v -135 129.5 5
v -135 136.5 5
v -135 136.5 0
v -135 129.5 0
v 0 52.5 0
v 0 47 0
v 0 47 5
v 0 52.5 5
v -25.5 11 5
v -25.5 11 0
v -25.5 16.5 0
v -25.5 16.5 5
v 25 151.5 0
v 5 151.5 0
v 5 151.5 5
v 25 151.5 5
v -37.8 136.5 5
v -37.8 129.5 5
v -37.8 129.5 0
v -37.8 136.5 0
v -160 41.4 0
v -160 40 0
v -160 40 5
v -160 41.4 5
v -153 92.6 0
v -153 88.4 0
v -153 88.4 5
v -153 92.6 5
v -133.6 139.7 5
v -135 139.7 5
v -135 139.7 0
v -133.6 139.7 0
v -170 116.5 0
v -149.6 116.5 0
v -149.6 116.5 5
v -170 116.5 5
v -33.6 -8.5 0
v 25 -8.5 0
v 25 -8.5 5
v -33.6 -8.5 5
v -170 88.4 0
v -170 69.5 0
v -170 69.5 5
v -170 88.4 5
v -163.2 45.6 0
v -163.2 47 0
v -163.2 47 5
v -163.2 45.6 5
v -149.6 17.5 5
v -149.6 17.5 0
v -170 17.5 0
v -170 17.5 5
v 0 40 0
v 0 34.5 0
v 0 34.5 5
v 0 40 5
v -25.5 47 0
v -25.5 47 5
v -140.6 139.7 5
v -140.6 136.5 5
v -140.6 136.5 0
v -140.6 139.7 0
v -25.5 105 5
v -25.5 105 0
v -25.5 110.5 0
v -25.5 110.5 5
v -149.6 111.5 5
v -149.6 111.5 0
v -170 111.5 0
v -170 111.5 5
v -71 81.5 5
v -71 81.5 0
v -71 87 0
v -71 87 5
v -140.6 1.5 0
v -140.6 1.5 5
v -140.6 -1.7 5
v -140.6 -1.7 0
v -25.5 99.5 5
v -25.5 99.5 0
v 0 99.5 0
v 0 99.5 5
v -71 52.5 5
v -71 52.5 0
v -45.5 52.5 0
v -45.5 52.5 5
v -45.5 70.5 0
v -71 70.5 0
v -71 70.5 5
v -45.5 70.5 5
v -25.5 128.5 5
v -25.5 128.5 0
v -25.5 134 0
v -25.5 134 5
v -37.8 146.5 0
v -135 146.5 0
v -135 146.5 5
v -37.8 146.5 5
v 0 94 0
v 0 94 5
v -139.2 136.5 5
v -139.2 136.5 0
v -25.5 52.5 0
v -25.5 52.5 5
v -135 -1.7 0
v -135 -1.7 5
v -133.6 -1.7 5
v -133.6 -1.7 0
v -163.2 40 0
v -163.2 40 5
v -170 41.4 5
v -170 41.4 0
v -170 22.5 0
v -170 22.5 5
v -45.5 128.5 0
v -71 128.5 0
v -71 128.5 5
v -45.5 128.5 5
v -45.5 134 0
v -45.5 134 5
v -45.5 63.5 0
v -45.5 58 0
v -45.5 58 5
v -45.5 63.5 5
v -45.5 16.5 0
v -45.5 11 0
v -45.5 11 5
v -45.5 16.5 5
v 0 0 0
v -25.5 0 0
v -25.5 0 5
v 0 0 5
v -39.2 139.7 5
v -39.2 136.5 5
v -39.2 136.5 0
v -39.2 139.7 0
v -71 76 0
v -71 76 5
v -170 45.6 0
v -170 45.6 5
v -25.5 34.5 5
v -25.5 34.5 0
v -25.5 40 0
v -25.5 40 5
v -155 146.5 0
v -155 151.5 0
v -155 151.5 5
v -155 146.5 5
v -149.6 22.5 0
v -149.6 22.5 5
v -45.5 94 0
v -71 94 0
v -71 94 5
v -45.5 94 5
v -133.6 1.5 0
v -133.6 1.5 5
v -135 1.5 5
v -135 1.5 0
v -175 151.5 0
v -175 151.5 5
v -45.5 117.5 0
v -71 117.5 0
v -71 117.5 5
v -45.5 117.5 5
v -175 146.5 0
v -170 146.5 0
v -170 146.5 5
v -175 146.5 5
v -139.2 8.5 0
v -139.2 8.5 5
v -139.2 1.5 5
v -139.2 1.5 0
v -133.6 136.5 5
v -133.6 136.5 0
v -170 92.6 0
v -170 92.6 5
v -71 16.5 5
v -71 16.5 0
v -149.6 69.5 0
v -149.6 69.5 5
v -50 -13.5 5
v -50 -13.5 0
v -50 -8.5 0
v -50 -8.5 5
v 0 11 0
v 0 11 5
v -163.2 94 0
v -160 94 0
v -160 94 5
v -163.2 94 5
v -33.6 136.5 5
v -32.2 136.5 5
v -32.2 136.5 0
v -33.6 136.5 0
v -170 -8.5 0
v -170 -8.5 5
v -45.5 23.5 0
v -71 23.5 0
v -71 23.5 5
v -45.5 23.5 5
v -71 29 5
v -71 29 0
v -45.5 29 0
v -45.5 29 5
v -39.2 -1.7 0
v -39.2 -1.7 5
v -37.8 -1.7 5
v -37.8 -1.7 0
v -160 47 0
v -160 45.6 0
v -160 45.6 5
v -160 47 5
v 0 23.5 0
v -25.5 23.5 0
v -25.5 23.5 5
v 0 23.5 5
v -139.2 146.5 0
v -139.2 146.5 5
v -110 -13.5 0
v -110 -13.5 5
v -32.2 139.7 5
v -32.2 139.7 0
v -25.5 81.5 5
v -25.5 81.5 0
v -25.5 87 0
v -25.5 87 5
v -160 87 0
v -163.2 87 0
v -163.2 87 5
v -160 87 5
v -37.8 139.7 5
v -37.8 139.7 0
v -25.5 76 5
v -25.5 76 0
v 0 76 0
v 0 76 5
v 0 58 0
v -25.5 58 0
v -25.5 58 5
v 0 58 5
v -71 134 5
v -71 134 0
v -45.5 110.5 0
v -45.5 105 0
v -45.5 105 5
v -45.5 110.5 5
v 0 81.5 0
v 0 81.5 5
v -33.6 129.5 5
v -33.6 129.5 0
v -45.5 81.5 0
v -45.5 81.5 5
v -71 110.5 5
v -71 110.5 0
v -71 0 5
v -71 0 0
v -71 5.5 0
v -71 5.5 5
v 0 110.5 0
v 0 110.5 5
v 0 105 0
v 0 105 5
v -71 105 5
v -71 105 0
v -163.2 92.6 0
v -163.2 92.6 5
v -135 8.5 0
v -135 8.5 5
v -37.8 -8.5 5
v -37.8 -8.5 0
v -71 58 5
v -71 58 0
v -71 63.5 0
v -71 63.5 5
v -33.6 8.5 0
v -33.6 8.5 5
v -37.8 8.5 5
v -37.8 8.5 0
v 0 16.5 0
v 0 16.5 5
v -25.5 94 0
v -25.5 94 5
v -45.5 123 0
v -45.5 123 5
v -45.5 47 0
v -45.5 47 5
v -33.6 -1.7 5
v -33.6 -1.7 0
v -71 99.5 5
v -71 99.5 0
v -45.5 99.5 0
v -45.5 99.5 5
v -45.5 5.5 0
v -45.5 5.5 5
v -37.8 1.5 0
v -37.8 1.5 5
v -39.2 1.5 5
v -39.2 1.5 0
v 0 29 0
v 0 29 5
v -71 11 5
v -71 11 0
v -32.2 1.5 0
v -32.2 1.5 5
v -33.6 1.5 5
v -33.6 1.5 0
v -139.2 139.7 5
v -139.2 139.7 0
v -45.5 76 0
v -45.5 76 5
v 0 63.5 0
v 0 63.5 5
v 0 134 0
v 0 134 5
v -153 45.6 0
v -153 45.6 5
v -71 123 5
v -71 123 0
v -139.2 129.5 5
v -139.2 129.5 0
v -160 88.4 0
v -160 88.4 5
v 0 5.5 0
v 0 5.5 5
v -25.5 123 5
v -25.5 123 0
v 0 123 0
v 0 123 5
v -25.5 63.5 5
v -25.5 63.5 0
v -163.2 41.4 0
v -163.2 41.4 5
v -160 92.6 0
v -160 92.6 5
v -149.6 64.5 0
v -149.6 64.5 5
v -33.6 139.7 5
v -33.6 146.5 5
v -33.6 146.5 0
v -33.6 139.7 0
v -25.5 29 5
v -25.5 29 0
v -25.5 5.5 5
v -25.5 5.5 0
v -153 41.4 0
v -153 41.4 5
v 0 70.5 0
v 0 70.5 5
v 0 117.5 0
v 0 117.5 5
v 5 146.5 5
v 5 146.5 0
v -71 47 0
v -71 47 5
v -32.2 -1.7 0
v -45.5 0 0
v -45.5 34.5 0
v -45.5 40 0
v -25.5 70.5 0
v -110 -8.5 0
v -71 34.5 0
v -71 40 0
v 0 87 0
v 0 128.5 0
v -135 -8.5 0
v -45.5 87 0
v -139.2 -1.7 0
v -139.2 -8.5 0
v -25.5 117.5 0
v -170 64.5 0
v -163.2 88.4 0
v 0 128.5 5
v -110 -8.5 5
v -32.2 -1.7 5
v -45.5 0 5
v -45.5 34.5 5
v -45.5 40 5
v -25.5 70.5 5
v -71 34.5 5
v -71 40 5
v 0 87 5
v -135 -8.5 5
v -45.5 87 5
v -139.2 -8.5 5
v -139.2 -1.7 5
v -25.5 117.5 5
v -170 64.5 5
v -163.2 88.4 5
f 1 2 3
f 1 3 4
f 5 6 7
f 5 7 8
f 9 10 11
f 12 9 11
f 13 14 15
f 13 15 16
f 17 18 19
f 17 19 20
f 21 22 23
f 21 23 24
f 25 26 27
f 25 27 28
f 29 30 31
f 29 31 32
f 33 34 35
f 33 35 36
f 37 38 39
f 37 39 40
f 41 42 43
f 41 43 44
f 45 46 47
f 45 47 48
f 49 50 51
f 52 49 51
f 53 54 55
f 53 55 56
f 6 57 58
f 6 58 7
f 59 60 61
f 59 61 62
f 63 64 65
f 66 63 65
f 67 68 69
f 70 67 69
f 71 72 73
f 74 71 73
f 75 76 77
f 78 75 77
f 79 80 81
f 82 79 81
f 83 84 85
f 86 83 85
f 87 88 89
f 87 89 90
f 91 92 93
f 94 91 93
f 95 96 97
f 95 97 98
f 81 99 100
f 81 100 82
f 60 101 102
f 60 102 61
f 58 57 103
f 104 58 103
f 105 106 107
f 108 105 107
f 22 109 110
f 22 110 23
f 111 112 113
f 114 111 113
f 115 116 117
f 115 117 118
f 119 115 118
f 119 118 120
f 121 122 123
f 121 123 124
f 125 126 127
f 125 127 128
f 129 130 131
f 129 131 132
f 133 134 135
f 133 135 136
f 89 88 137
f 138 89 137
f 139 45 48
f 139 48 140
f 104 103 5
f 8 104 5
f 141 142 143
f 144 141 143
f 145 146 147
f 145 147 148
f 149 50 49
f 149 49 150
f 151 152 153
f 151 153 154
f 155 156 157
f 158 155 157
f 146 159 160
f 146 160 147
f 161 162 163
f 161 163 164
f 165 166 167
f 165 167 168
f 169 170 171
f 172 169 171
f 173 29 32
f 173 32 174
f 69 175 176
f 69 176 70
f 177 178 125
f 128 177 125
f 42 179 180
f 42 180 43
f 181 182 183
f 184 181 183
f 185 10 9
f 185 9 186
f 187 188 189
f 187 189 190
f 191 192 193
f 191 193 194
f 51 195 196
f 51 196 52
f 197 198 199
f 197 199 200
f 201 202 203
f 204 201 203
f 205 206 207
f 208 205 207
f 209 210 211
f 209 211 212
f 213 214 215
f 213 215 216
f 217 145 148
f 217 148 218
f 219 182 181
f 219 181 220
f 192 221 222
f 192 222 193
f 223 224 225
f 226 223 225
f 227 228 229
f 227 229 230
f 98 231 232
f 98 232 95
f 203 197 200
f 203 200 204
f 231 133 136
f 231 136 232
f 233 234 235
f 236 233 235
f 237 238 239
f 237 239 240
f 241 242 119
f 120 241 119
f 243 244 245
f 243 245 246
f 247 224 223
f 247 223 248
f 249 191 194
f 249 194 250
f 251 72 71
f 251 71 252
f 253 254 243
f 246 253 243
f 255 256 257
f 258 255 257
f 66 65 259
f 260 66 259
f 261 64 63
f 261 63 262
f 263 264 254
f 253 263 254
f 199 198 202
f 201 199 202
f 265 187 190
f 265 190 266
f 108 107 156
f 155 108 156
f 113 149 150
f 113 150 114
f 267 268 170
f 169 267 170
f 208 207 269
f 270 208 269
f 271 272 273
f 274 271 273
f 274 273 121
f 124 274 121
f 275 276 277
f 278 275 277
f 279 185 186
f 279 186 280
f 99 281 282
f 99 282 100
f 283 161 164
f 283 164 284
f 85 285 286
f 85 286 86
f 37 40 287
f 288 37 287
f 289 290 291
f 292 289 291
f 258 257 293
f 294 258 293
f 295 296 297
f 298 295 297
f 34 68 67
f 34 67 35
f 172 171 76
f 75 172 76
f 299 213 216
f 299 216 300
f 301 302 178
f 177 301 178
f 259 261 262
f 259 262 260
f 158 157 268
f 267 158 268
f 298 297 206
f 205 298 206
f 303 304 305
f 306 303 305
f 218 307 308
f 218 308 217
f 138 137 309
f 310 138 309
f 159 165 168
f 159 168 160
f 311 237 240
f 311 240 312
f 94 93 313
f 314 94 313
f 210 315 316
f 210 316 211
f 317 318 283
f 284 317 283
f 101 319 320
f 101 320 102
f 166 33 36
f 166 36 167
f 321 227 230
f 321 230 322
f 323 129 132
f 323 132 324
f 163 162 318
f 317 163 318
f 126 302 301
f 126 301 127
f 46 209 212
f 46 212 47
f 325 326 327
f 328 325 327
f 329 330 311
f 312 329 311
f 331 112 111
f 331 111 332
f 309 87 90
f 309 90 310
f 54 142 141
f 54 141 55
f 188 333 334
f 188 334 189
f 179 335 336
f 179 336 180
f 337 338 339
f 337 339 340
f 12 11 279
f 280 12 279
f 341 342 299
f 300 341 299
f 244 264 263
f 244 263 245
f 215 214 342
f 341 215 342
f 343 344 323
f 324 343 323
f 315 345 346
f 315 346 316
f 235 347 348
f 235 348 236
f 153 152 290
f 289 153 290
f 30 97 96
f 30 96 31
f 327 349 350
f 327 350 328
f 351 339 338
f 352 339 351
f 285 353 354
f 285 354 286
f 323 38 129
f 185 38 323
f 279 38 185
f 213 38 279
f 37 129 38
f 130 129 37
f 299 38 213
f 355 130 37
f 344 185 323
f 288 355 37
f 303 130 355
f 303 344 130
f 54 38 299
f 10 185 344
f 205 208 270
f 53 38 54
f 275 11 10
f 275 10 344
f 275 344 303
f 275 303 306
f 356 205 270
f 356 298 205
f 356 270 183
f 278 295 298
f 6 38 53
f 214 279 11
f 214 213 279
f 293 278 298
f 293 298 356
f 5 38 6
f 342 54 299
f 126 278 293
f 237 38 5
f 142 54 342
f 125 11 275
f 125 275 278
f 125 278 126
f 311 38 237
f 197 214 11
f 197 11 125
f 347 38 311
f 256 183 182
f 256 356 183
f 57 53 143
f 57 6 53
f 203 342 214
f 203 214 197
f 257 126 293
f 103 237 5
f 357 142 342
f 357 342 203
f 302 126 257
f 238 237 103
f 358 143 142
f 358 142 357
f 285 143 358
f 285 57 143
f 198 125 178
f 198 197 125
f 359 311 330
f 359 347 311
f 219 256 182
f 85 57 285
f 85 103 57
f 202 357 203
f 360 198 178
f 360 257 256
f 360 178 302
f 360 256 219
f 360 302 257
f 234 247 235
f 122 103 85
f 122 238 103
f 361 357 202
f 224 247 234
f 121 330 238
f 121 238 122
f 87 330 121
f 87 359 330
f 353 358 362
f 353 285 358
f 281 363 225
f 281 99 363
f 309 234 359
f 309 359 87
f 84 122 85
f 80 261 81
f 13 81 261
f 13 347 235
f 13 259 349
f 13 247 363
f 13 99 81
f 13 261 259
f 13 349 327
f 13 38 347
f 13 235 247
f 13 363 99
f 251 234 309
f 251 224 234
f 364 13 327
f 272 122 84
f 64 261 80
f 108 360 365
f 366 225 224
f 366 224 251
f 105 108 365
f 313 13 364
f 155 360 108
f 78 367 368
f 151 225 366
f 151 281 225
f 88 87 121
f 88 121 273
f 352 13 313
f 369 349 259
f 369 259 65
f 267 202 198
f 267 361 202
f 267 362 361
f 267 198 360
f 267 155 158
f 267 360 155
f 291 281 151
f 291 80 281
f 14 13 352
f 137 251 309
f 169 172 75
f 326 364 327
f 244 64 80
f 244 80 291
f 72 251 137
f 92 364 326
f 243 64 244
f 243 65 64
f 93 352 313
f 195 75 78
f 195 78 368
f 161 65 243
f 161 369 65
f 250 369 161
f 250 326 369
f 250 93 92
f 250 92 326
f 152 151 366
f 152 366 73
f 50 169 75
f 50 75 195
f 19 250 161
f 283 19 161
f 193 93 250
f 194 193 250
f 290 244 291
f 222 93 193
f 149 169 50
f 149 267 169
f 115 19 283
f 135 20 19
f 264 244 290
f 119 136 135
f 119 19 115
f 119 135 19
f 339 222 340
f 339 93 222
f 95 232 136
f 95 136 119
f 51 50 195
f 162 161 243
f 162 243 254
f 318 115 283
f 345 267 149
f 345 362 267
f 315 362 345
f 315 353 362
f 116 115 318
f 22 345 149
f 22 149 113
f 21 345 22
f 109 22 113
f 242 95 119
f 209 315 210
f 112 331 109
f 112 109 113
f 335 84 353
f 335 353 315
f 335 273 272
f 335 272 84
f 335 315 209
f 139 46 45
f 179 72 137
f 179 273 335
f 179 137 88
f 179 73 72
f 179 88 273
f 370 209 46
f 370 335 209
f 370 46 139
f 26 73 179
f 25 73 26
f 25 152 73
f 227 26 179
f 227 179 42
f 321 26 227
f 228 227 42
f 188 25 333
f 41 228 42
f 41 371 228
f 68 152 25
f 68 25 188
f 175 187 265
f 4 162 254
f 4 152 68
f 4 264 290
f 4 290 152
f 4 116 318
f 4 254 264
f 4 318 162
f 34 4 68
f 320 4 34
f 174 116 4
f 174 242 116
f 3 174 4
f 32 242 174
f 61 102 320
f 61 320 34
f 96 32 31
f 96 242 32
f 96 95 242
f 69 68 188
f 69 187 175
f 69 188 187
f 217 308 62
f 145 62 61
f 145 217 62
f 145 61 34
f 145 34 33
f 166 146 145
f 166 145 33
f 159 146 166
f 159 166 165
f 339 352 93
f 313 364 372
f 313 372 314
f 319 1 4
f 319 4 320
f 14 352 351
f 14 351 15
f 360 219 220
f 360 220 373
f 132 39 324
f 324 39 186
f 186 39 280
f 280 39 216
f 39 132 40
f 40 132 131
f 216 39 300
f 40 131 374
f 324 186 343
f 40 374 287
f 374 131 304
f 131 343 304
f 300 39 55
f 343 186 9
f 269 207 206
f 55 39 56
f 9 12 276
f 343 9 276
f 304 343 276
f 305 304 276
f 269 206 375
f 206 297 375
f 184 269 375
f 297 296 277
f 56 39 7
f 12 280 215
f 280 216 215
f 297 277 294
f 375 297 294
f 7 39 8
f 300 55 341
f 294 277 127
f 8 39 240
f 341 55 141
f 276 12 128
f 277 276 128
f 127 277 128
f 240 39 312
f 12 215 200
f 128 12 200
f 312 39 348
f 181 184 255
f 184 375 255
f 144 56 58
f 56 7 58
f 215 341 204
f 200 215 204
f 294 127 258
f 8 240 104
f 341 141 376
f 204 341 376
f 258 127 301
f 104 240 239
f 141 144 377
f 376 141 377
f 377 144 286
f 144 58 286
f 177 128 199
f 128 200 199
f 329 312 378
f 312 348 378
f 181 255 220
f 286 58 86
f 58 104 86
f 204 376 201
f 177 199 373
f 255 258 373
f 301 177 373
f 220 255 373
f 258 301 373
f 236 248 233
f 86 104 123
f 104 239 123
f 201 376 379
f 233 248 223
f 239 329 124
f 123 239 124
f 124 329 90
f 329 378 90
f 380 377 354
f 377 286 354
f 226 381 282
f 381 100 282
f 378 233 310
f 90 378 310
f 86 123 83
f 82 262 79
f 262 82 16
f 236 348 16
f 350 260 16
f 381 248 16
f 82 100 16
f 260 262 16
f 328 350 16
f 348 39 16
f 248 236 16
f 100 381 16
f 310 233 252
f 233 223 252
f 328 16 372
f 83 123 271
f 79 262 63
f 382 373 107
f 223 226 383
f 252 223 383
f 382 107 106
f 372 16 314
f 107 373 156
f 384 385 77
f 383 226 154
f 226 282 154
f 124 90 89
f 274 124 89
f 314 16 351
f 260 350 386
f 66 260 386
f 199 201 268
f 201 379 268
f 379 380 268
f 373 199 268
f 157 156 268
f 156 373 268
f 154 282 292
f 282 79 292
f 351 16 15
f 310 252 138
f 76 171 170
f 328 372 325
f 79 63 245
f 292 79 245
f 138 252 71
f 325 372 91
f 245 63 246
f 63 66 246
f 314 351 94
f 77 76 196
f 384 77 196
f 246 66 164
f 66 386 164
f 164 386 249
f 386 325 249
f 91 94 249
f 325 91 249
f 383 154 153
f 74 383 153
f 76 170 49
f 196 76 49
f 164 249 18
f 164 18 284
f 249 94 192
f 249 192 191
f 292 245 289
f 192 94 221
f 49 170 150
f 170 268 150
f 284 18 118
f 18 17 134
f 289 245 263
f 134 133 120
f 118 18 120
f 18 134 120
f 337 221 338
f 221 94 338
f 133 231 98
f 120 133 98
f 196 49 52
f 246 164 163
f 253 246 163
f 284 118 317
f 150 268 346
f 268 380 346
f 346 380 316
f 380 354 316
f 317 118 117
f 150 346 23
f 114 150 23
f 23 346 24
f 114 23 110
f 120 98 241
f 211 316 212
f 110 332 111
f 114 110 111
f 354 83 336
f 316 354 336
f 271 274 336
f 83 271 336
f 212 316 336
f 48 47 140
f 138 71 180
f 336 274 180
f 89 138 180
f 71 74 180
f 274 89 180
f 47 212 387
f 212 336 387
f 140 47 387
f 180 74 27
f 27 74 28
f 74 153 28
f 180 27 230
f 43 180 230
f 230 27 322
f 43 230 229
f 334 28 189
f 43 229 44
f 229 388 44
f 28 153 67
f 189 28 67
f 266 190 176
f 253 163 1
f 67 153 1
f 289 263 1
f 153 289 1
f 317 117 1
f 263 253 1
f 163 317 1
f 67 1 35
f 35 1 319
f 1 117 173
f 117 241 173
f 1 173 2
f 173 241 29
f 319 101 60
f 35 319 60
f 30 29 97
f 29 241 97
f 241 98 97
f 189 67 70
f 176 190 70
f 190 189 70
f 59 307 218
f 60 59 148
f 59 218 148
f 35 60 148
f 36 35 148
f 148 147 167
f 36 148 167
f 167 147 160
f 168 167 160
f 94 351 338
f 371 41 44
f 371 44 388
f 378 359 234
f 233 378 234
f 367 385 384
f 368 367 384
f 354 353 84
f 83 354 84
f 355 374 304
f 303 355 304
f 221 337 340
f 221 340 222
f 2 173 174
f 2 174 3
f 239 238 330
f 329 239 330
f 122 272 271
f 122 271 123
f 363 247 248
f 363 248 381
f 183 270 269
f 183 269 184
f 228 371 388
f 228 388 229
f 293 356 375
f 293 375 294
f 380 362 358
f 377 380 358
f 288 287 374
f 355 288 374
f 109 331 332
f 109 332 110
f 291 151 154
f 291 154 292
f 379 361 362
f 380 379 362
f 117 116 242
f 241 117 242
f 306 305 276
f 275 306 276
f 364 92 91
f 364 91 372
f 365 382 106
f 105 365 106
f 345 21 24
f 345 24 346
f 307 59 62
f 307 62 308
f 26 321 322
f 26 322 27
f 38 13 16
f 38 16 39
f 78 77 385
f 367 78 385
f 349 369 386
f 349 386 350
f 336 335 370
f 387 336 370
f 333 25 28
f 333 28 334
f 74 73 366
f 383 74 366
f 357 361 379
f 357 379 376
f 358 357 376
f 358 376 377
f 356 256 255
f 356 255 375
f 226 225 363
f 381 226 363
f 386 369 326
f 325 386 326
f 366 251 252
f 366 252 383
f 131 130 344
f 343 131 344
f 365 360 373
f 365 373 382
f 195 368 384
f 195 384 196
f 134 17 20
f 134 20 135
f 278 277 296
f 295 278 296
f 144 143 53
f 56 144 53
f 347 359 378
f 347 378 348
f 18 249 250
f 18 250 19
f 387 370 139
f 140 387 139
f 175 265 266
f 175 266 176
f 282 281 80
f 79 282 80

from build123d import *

# Parameters (mm, degrees)
SKETCH1_W           = 25.5
SKETCH1_H           = 5.5
BOSS_EXTRUDE1_DEPTH = 5
CUT_EXTRUDE1_DEPTH  = 10
SKETCH5_W           = 60
SKETCH5_H           = 5
BOSS_EXTRUDE2_DEPTH = 5
SKETCH6_W           = 20.4
SKETCH6_H           = 5
CUT_EXTRUDE2_DEPTH  = 10


with BuildPart() as part:
    # Sketch1 → Boss-Extrude1 (new body)
    with BuildSketch(Plane.XY):
        Polygon((-155, 151.5), (-155, 146.5), (5, 146.5), (5, 151.5), (25, 151.5), (25, -8.5), (-170, -8.5), (-170, 17.5), (-150, 17.5), (-150, 22.5), (-170, 22.5), (-170, 41), (-170, 41.4), (-163.2, 41.4), (-163.2, 40), (-160, 40), (-160, 41.4), (-153, 41.4), (-153, 45.6), (-160, 45.6), (-160, 47), (-163.2, 47), (-163.2, 45.6), (-170, 45.6), (-170, 46), (-170, 64.5), (-150, 64.5), (-150, 69.5), (-170, 69.5), (-170, 88.4), (-163.2, 88.4), (-163.2, 87), (-160, 87), (-160, 88.4), (-153, 88.4), (-153, 92.6), (-160, 92.6), (-160, 94), (-163.2, 94), (-163.2, 92.6), (-170, 92.6), (-170, 111.5), (-150, 111.5), (-150, 116.5), (-170, 116.5), (-170, 146.5), (-175, 146.5), (-175, 151.5), align=None)
        with Locations((-58.25, 13.75)):
            Rectangle(SKETCH1_W, SKETCH1_H, mode=Mode.SUBTRACT)
        with Locations((-12.75, 2.75)):
            Rectangle(SKETCH1_W, SKETCH1_H, mode=Mode.SUBTRACT)
        with Locations((-58.25, 2.75)):
            Rectangle(SKETCH1_W, SKETCH1_H, mode=Mode.SUBTRACT)
        with Locations((-12.75, 13.75)):
            Rectangle(SKETCH1_W, SKETCH1_H, mode=Mode.SUBTRACT)
        with Locations((-12.75, 26.25)):
            Rectangle(SKETCH1_W, SKETCH1_H, mode=Mode.SUBTRACT)
        with Locations((-58.25, 26.25)):
            Rectangle(SKETCH1_W, SKETCH1_H, mode=Mode.SUBTRACT)
        with Locations((-58.25, 37.25)):
            Rectangle(SKETCH1_W, SKETCH1_H, mode=Mode.SUBTRACT)
        with Locations((-12.75, 37.25)):
            Rectangle(SKETCH1_W, SKETCH1_H, mode=Mode.SUBTRACT)
        with Locations((-12.75, 49.75)):
            Rectangle(SKETCH1_W, SKETCH1_H, mode=Mode.SUBTRACT)
        with Locations((-58.25, 49.75)):
            Rectangle(SKETCH1_W, SKETCH1_H, mode=Mode.SUBTRACT)
        with Locations((-58.25, 60.75)):
            Rectangle(SKETCH1_W, SKETCH1_H, mode=Mode.SUBTRACT)
        with Locations((-12.75, 60.75)):
            Rectangle(SKETCH1_W, SKETCH1_H, mode=Mode.SUBTRACT)
        with Locations((-12.75, 73.25)):
            Rectangle(SKETCH1_W, SKETCH1_H, mode=Mode.SUBTRACT)
        with Locations((-58.25, 73.25)):
            Rectangle(SKETCH1_W, SKETCH1_H, mode=Mode.SUBTRACT)
        with Locations((-58.25, 84.25)):
            Rectangle(SKETCH1_W, SKETCH1_H, mode=Mode.SUBTRACT)
        with Locations((-12.75, 84.25)):
            Rectangle(SKETCH1_W, SKETCH1_H, mode=Mode.SUBTRACT)
        with Locations((-12.75, 96.75)):
            Rectangle(SKETCH1_W, SKETCH1_H, mode=Mode.SUBTRACT)
        with Locations((-58.25, 96.75)):
            Rectangle(SKETCH1_W, SKETCH1_H, mode=Mode.SUBTRACT)
        with Locations((-58.25, 107.75)):
            Rectangle(SKETCH1_W, SKETCH1_H, mode=Mode.SUBTRACT)
        with Locations((-12.75, 107.75)):
            Rectangle(SKETCH1_W, SKETCH1_H, mode=Mode.SUBTRACT)
        with Locations((-12.75, 120.25)):
            Rectangle(SKETCH1_W, SKETCH1_H, mode=Mode.SUBTRACT)
        with Locations((-58.25, 120.25)):
            Rectangle(SKETCH1_W, SKETCH1_H, mode=Mode.SUBTRACT)
        with Locations((-58.25, 131.25)):
            Rectangle(SKETCH1_W, SKETCH1_H, mode=Mode.SUBTRACT)
        with Locations((-12.75, 131.25)):
            Rectangle(SKETCH1_W, SKETCH1_H, mode=Mode.SUBTRACT)
    extrude(amount=BOSS_EXTRUDE1_DEPTH)

    # Sketch4 → Cut-Extrude1 (cut)
    with BuildSketch(Plane.XY.offset(5)):
        Polygon((-37.8, 129.5), (-37.8, 136.5), (-39.2, 136.5), (-39.2, 139.7), (-37.8, 139.7), (-37.8, 146.5), (-33.6, 146.5), (-33.6, 139.7), (-32.2, 139.7), (-32.2, 136.5), (-33.6, 136.5), (-33.6, 129.5), align=None)
        Polygon((-139.2, 139.7), (-139.2, 146.5), (-135, 146.5), (-135, 139.7), (-133.6, 139.7), (-133.6, 136.5), (-135, 136.5), (-135, 129.5), (-139.2, 129.5), (-139.2, 136.5), (-140.6, 136.5), (-140.6, 139.7), align=None)
        Polygon((-37.8, -8.5), (-33.6, -8.5), (-33.6, -1.7), (-32.2, -1.7), (-32.2, 1.5), (-33.6, 1.5), (-33.6, 8.5), (-37.8, 8.5), (-37.8, 1.5), (-39.2, 1.5), (-39.2, -1.7), (-37.8, -1.7), align=None)
        Polygon((-139.2, -8.5), (-135, -8.5), (-135, -1.7), (-133.6, -1.7), (-133.6, 1.5), (-135, 1.5), (-135, 8.5), (-139.2, 8.5), (-139.2, 1.5), (-140.6, 1.5), (-140.6, -1.7), (-139.2, -1.7), align=None)
    extrude(amount=-CUT_EXTRUDE1_DEPTH, mode=Mode.SUBTRACT)

    # Sketch5 → Boss-Extrude2 (add)
    with BuildSketch(Plane(origin=(0, 0, 0), x_dir=(-1, 0, 0), z_dir=(0, 0, -1))):
        with Locations((80, -11)):
            Rectangle(SKETCH5_W, SKETCH5_H)
    extrude(amount=-BOSS_EXTRUDE2_DEPTH)

    # Sketch6 → Cut-Extrude2 (cut)
    with BuildSketch(Plane(origin=(0, 0, 0), x_dir=(-1, 0, 0), z_dir=(0, 0, -1))):
        with Locations((159.8, 114)):
            Rectangle(SKETCH6_W, SKETCH6_H)
        with Locations((159.8, 67)):
            Rectangle(SKETCH6_W, SKETCH6_H)
        with Locations((159.8, 20)):
            Rectangle(SKETCH6_W, SKETCH6_H)
    extrude(amount=-CUT_EXTRUDE2_DEPTH, mode=Mode.SUBTRACT)


solid = part.part
